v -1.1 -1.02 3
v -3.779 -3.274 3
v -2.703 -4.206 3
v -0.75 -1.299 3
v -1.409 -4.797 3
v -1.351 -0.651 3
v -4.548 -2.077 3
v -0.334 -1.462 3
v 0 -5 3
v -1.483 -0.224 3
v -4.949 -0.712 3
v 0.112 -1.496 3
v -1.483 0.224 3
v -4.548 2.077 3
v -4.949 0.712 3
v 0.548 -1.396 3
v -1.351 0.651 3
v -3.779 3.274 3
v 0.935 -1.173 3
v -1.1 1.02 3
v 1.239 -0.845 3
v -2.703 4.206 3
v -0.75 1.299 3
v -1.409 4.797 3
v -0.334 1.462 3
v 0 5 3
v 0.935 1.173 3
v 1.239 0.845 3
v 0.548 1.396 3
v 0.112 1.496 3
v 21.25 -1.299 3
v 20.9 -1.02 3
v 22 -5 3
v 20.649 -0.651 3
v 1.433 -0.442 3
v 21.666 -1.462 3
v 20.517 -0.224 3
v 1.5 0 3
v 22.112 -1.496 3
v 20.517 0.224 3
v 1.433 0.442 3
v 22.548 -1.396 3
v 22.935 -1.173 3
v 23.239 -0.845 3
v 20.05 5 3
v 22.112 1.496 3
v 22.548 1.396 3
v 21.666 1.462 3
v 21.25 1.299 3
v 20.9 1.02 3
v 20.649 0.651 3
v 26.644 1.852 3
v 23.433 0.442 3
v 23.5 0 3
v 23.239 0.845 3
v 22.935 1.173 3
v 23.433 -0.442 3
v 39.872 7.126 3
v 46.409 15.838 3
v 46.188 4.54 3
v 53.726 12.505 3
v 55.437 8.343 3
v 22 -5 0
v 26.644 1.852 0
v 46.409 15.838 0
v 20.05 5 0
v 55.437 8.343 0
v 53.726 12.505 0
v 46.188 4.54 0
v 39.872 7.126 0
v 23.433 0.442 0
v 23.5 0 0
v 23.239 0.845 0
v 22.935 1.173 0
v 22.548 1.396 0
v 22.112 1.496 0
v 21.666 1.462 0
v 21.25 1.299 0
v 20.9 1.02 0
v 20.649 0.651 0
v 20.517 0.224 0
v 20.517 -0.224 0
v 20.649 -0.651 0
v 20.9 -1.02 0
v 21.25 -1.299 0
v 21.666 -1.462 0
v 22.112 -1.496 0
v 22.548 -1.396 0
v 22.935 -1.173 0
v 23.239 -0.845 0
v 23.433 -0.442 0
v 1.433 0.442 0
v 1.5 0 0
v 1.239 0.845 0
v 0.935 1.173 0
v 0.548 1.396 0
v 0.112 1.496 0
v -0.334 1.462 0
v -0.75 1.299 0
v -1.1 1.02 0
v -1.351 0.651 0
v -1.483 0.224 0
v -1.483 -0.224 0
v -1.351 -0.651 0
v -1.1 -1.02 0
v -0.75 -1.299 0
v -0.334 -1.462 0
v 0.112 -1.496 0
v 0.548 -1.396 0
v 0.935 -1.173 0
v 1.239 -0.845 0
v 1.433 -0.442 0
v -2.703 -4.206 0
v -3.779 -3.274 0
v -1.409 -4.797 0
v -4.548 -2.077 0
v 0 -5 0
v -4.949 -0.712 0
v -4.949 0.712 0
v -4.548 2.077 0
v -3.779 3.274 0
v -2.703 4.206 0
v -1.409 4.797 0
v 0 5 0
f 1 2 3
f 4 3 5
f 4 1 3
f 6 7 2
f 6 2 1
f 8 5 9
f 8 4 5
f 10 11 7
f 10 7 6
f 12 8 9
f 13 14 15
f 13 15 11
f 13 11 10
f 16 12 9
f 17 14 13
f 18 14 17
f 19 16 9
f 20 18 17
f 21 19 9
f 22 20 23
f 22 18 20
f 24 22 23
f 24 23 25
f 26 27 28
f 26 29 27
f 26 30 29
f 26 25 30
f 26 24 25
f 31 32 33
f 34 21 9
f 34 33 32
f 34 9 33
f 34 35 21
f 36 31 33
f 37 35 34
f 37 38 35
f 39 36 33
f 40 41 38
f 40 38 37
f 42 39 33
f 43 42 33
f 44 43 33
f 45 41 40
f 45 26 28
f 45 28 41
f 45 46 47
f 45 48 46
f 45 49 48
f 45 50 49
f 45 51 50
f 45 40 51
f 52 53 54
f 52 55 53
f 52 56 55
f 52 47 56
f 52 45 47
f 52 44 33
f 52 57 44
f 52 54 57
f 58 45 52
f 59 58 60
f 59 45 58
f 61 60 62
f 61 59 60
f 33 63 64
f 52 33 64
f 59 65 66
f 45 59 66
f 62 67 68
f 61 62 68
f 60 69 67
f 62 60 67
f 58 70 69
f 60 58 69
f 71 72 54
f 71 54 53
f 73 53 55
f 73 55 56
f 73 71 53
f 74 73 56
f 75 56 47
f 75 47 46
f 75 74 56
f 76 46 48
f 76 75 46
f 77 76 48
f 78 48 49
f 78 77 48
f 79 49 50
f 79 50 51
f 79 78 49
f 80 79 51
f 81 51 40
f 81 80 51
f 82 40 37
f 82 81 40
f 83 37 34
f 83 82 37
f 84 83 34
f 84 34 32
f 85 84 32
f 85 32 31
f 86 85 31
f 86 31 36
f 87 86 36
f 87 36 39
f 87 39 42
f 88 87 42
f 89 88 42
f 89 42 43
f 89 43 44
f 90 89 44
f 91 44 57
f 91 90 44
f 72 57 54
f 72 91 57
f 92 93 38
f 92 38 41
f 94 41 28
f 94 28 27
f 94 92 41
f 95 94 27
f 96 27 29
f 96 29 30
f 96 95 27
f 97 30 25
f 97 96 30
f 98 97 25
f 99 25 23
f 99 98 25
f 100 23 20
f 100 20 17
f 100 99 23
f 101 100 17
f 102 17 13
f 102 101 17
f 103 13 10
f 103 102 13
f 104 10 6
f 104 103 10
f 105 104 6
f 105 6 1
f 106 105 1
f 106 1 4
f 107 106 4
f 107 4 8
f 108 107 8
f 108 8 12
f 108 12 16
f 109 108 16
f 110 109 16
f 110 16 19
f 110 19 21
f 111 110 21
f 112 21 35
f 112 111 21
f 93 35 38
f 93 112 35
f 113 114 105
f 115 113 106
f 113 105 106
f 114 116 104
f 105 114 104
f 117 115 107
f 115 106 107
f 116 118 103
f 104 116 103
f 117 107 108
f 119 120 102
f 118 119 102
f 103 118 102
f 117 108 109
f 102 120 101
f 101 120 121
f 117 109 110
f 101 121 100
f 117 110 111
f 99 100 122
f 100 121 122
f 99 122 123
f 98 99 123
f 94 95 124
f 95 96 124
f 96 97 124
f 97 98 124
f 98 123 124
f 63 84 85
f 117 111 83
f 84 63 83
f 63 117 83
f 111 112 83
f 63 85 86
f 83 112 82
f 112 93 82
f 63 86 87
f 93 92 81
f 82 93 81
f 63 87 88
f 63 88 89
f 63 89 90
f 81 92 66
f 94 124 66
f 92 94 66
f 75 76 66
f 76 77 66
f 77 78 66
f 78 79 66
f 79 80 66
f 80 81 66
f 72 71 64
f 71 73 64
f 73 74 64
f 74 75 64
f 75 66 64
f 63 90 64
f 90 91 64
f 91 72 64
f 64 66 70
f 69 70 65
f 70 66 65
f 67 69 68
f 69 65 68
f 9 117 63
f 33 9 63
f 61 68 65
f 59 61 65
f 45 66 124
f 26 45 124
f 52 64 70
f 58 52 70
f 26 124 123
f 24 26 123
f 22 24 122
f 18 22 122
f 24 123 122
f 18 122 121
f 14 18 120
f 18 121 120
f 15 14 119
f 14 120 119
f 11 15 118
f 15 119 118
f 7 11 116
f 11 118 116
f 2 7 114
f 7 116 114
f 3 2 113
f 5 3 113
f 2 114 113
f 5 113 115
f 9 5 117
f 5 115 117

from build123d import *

# Parameters (mm, degrees)
SKETCH_1_R      = 1.5
EXTRUDE_1_DEPTH = 3


with BuildPart() as part:
    # 草图1 → 凸台-拉伸1 (new body)
    with BuildSketch(Plane.XY):
        with BuildLine():
            Line((20.05, 5), (0, 5))
            ThreePointArc((0, 5), (-5, 0), (0, -5))
            Line((0, -5), (22, -5))
            Line((22, -5), (26.644435765, 1.851814361))
            Line((26.644435765, 1.851814361), (39.871788822, 7.125781662))
            Line((39.871788822, 7.125781662), (46.188488025, 4.540007042))
            Line((46.188488025, 4.540007042), (55.437270307, 8.34264117))
            Line((55.437270307, 8.34264117), (53.72608495, 12.504593197))
            Line((53.72608495, 12.504593197), (46.409029503, 15.837507263))
            Line((46.409029503, 15.837507263), (20.05, 5))
        make_face()
        Circle(SKETCH_1_R, mode=Mode.SUBTRACT)
        with Locations((22, 0)):
            Circle(SKETCH_1_R, mode=Mode.SUBTRACT)
    extrude(amount=EXTRUDE_1_DEPTH)


solid = part.part
